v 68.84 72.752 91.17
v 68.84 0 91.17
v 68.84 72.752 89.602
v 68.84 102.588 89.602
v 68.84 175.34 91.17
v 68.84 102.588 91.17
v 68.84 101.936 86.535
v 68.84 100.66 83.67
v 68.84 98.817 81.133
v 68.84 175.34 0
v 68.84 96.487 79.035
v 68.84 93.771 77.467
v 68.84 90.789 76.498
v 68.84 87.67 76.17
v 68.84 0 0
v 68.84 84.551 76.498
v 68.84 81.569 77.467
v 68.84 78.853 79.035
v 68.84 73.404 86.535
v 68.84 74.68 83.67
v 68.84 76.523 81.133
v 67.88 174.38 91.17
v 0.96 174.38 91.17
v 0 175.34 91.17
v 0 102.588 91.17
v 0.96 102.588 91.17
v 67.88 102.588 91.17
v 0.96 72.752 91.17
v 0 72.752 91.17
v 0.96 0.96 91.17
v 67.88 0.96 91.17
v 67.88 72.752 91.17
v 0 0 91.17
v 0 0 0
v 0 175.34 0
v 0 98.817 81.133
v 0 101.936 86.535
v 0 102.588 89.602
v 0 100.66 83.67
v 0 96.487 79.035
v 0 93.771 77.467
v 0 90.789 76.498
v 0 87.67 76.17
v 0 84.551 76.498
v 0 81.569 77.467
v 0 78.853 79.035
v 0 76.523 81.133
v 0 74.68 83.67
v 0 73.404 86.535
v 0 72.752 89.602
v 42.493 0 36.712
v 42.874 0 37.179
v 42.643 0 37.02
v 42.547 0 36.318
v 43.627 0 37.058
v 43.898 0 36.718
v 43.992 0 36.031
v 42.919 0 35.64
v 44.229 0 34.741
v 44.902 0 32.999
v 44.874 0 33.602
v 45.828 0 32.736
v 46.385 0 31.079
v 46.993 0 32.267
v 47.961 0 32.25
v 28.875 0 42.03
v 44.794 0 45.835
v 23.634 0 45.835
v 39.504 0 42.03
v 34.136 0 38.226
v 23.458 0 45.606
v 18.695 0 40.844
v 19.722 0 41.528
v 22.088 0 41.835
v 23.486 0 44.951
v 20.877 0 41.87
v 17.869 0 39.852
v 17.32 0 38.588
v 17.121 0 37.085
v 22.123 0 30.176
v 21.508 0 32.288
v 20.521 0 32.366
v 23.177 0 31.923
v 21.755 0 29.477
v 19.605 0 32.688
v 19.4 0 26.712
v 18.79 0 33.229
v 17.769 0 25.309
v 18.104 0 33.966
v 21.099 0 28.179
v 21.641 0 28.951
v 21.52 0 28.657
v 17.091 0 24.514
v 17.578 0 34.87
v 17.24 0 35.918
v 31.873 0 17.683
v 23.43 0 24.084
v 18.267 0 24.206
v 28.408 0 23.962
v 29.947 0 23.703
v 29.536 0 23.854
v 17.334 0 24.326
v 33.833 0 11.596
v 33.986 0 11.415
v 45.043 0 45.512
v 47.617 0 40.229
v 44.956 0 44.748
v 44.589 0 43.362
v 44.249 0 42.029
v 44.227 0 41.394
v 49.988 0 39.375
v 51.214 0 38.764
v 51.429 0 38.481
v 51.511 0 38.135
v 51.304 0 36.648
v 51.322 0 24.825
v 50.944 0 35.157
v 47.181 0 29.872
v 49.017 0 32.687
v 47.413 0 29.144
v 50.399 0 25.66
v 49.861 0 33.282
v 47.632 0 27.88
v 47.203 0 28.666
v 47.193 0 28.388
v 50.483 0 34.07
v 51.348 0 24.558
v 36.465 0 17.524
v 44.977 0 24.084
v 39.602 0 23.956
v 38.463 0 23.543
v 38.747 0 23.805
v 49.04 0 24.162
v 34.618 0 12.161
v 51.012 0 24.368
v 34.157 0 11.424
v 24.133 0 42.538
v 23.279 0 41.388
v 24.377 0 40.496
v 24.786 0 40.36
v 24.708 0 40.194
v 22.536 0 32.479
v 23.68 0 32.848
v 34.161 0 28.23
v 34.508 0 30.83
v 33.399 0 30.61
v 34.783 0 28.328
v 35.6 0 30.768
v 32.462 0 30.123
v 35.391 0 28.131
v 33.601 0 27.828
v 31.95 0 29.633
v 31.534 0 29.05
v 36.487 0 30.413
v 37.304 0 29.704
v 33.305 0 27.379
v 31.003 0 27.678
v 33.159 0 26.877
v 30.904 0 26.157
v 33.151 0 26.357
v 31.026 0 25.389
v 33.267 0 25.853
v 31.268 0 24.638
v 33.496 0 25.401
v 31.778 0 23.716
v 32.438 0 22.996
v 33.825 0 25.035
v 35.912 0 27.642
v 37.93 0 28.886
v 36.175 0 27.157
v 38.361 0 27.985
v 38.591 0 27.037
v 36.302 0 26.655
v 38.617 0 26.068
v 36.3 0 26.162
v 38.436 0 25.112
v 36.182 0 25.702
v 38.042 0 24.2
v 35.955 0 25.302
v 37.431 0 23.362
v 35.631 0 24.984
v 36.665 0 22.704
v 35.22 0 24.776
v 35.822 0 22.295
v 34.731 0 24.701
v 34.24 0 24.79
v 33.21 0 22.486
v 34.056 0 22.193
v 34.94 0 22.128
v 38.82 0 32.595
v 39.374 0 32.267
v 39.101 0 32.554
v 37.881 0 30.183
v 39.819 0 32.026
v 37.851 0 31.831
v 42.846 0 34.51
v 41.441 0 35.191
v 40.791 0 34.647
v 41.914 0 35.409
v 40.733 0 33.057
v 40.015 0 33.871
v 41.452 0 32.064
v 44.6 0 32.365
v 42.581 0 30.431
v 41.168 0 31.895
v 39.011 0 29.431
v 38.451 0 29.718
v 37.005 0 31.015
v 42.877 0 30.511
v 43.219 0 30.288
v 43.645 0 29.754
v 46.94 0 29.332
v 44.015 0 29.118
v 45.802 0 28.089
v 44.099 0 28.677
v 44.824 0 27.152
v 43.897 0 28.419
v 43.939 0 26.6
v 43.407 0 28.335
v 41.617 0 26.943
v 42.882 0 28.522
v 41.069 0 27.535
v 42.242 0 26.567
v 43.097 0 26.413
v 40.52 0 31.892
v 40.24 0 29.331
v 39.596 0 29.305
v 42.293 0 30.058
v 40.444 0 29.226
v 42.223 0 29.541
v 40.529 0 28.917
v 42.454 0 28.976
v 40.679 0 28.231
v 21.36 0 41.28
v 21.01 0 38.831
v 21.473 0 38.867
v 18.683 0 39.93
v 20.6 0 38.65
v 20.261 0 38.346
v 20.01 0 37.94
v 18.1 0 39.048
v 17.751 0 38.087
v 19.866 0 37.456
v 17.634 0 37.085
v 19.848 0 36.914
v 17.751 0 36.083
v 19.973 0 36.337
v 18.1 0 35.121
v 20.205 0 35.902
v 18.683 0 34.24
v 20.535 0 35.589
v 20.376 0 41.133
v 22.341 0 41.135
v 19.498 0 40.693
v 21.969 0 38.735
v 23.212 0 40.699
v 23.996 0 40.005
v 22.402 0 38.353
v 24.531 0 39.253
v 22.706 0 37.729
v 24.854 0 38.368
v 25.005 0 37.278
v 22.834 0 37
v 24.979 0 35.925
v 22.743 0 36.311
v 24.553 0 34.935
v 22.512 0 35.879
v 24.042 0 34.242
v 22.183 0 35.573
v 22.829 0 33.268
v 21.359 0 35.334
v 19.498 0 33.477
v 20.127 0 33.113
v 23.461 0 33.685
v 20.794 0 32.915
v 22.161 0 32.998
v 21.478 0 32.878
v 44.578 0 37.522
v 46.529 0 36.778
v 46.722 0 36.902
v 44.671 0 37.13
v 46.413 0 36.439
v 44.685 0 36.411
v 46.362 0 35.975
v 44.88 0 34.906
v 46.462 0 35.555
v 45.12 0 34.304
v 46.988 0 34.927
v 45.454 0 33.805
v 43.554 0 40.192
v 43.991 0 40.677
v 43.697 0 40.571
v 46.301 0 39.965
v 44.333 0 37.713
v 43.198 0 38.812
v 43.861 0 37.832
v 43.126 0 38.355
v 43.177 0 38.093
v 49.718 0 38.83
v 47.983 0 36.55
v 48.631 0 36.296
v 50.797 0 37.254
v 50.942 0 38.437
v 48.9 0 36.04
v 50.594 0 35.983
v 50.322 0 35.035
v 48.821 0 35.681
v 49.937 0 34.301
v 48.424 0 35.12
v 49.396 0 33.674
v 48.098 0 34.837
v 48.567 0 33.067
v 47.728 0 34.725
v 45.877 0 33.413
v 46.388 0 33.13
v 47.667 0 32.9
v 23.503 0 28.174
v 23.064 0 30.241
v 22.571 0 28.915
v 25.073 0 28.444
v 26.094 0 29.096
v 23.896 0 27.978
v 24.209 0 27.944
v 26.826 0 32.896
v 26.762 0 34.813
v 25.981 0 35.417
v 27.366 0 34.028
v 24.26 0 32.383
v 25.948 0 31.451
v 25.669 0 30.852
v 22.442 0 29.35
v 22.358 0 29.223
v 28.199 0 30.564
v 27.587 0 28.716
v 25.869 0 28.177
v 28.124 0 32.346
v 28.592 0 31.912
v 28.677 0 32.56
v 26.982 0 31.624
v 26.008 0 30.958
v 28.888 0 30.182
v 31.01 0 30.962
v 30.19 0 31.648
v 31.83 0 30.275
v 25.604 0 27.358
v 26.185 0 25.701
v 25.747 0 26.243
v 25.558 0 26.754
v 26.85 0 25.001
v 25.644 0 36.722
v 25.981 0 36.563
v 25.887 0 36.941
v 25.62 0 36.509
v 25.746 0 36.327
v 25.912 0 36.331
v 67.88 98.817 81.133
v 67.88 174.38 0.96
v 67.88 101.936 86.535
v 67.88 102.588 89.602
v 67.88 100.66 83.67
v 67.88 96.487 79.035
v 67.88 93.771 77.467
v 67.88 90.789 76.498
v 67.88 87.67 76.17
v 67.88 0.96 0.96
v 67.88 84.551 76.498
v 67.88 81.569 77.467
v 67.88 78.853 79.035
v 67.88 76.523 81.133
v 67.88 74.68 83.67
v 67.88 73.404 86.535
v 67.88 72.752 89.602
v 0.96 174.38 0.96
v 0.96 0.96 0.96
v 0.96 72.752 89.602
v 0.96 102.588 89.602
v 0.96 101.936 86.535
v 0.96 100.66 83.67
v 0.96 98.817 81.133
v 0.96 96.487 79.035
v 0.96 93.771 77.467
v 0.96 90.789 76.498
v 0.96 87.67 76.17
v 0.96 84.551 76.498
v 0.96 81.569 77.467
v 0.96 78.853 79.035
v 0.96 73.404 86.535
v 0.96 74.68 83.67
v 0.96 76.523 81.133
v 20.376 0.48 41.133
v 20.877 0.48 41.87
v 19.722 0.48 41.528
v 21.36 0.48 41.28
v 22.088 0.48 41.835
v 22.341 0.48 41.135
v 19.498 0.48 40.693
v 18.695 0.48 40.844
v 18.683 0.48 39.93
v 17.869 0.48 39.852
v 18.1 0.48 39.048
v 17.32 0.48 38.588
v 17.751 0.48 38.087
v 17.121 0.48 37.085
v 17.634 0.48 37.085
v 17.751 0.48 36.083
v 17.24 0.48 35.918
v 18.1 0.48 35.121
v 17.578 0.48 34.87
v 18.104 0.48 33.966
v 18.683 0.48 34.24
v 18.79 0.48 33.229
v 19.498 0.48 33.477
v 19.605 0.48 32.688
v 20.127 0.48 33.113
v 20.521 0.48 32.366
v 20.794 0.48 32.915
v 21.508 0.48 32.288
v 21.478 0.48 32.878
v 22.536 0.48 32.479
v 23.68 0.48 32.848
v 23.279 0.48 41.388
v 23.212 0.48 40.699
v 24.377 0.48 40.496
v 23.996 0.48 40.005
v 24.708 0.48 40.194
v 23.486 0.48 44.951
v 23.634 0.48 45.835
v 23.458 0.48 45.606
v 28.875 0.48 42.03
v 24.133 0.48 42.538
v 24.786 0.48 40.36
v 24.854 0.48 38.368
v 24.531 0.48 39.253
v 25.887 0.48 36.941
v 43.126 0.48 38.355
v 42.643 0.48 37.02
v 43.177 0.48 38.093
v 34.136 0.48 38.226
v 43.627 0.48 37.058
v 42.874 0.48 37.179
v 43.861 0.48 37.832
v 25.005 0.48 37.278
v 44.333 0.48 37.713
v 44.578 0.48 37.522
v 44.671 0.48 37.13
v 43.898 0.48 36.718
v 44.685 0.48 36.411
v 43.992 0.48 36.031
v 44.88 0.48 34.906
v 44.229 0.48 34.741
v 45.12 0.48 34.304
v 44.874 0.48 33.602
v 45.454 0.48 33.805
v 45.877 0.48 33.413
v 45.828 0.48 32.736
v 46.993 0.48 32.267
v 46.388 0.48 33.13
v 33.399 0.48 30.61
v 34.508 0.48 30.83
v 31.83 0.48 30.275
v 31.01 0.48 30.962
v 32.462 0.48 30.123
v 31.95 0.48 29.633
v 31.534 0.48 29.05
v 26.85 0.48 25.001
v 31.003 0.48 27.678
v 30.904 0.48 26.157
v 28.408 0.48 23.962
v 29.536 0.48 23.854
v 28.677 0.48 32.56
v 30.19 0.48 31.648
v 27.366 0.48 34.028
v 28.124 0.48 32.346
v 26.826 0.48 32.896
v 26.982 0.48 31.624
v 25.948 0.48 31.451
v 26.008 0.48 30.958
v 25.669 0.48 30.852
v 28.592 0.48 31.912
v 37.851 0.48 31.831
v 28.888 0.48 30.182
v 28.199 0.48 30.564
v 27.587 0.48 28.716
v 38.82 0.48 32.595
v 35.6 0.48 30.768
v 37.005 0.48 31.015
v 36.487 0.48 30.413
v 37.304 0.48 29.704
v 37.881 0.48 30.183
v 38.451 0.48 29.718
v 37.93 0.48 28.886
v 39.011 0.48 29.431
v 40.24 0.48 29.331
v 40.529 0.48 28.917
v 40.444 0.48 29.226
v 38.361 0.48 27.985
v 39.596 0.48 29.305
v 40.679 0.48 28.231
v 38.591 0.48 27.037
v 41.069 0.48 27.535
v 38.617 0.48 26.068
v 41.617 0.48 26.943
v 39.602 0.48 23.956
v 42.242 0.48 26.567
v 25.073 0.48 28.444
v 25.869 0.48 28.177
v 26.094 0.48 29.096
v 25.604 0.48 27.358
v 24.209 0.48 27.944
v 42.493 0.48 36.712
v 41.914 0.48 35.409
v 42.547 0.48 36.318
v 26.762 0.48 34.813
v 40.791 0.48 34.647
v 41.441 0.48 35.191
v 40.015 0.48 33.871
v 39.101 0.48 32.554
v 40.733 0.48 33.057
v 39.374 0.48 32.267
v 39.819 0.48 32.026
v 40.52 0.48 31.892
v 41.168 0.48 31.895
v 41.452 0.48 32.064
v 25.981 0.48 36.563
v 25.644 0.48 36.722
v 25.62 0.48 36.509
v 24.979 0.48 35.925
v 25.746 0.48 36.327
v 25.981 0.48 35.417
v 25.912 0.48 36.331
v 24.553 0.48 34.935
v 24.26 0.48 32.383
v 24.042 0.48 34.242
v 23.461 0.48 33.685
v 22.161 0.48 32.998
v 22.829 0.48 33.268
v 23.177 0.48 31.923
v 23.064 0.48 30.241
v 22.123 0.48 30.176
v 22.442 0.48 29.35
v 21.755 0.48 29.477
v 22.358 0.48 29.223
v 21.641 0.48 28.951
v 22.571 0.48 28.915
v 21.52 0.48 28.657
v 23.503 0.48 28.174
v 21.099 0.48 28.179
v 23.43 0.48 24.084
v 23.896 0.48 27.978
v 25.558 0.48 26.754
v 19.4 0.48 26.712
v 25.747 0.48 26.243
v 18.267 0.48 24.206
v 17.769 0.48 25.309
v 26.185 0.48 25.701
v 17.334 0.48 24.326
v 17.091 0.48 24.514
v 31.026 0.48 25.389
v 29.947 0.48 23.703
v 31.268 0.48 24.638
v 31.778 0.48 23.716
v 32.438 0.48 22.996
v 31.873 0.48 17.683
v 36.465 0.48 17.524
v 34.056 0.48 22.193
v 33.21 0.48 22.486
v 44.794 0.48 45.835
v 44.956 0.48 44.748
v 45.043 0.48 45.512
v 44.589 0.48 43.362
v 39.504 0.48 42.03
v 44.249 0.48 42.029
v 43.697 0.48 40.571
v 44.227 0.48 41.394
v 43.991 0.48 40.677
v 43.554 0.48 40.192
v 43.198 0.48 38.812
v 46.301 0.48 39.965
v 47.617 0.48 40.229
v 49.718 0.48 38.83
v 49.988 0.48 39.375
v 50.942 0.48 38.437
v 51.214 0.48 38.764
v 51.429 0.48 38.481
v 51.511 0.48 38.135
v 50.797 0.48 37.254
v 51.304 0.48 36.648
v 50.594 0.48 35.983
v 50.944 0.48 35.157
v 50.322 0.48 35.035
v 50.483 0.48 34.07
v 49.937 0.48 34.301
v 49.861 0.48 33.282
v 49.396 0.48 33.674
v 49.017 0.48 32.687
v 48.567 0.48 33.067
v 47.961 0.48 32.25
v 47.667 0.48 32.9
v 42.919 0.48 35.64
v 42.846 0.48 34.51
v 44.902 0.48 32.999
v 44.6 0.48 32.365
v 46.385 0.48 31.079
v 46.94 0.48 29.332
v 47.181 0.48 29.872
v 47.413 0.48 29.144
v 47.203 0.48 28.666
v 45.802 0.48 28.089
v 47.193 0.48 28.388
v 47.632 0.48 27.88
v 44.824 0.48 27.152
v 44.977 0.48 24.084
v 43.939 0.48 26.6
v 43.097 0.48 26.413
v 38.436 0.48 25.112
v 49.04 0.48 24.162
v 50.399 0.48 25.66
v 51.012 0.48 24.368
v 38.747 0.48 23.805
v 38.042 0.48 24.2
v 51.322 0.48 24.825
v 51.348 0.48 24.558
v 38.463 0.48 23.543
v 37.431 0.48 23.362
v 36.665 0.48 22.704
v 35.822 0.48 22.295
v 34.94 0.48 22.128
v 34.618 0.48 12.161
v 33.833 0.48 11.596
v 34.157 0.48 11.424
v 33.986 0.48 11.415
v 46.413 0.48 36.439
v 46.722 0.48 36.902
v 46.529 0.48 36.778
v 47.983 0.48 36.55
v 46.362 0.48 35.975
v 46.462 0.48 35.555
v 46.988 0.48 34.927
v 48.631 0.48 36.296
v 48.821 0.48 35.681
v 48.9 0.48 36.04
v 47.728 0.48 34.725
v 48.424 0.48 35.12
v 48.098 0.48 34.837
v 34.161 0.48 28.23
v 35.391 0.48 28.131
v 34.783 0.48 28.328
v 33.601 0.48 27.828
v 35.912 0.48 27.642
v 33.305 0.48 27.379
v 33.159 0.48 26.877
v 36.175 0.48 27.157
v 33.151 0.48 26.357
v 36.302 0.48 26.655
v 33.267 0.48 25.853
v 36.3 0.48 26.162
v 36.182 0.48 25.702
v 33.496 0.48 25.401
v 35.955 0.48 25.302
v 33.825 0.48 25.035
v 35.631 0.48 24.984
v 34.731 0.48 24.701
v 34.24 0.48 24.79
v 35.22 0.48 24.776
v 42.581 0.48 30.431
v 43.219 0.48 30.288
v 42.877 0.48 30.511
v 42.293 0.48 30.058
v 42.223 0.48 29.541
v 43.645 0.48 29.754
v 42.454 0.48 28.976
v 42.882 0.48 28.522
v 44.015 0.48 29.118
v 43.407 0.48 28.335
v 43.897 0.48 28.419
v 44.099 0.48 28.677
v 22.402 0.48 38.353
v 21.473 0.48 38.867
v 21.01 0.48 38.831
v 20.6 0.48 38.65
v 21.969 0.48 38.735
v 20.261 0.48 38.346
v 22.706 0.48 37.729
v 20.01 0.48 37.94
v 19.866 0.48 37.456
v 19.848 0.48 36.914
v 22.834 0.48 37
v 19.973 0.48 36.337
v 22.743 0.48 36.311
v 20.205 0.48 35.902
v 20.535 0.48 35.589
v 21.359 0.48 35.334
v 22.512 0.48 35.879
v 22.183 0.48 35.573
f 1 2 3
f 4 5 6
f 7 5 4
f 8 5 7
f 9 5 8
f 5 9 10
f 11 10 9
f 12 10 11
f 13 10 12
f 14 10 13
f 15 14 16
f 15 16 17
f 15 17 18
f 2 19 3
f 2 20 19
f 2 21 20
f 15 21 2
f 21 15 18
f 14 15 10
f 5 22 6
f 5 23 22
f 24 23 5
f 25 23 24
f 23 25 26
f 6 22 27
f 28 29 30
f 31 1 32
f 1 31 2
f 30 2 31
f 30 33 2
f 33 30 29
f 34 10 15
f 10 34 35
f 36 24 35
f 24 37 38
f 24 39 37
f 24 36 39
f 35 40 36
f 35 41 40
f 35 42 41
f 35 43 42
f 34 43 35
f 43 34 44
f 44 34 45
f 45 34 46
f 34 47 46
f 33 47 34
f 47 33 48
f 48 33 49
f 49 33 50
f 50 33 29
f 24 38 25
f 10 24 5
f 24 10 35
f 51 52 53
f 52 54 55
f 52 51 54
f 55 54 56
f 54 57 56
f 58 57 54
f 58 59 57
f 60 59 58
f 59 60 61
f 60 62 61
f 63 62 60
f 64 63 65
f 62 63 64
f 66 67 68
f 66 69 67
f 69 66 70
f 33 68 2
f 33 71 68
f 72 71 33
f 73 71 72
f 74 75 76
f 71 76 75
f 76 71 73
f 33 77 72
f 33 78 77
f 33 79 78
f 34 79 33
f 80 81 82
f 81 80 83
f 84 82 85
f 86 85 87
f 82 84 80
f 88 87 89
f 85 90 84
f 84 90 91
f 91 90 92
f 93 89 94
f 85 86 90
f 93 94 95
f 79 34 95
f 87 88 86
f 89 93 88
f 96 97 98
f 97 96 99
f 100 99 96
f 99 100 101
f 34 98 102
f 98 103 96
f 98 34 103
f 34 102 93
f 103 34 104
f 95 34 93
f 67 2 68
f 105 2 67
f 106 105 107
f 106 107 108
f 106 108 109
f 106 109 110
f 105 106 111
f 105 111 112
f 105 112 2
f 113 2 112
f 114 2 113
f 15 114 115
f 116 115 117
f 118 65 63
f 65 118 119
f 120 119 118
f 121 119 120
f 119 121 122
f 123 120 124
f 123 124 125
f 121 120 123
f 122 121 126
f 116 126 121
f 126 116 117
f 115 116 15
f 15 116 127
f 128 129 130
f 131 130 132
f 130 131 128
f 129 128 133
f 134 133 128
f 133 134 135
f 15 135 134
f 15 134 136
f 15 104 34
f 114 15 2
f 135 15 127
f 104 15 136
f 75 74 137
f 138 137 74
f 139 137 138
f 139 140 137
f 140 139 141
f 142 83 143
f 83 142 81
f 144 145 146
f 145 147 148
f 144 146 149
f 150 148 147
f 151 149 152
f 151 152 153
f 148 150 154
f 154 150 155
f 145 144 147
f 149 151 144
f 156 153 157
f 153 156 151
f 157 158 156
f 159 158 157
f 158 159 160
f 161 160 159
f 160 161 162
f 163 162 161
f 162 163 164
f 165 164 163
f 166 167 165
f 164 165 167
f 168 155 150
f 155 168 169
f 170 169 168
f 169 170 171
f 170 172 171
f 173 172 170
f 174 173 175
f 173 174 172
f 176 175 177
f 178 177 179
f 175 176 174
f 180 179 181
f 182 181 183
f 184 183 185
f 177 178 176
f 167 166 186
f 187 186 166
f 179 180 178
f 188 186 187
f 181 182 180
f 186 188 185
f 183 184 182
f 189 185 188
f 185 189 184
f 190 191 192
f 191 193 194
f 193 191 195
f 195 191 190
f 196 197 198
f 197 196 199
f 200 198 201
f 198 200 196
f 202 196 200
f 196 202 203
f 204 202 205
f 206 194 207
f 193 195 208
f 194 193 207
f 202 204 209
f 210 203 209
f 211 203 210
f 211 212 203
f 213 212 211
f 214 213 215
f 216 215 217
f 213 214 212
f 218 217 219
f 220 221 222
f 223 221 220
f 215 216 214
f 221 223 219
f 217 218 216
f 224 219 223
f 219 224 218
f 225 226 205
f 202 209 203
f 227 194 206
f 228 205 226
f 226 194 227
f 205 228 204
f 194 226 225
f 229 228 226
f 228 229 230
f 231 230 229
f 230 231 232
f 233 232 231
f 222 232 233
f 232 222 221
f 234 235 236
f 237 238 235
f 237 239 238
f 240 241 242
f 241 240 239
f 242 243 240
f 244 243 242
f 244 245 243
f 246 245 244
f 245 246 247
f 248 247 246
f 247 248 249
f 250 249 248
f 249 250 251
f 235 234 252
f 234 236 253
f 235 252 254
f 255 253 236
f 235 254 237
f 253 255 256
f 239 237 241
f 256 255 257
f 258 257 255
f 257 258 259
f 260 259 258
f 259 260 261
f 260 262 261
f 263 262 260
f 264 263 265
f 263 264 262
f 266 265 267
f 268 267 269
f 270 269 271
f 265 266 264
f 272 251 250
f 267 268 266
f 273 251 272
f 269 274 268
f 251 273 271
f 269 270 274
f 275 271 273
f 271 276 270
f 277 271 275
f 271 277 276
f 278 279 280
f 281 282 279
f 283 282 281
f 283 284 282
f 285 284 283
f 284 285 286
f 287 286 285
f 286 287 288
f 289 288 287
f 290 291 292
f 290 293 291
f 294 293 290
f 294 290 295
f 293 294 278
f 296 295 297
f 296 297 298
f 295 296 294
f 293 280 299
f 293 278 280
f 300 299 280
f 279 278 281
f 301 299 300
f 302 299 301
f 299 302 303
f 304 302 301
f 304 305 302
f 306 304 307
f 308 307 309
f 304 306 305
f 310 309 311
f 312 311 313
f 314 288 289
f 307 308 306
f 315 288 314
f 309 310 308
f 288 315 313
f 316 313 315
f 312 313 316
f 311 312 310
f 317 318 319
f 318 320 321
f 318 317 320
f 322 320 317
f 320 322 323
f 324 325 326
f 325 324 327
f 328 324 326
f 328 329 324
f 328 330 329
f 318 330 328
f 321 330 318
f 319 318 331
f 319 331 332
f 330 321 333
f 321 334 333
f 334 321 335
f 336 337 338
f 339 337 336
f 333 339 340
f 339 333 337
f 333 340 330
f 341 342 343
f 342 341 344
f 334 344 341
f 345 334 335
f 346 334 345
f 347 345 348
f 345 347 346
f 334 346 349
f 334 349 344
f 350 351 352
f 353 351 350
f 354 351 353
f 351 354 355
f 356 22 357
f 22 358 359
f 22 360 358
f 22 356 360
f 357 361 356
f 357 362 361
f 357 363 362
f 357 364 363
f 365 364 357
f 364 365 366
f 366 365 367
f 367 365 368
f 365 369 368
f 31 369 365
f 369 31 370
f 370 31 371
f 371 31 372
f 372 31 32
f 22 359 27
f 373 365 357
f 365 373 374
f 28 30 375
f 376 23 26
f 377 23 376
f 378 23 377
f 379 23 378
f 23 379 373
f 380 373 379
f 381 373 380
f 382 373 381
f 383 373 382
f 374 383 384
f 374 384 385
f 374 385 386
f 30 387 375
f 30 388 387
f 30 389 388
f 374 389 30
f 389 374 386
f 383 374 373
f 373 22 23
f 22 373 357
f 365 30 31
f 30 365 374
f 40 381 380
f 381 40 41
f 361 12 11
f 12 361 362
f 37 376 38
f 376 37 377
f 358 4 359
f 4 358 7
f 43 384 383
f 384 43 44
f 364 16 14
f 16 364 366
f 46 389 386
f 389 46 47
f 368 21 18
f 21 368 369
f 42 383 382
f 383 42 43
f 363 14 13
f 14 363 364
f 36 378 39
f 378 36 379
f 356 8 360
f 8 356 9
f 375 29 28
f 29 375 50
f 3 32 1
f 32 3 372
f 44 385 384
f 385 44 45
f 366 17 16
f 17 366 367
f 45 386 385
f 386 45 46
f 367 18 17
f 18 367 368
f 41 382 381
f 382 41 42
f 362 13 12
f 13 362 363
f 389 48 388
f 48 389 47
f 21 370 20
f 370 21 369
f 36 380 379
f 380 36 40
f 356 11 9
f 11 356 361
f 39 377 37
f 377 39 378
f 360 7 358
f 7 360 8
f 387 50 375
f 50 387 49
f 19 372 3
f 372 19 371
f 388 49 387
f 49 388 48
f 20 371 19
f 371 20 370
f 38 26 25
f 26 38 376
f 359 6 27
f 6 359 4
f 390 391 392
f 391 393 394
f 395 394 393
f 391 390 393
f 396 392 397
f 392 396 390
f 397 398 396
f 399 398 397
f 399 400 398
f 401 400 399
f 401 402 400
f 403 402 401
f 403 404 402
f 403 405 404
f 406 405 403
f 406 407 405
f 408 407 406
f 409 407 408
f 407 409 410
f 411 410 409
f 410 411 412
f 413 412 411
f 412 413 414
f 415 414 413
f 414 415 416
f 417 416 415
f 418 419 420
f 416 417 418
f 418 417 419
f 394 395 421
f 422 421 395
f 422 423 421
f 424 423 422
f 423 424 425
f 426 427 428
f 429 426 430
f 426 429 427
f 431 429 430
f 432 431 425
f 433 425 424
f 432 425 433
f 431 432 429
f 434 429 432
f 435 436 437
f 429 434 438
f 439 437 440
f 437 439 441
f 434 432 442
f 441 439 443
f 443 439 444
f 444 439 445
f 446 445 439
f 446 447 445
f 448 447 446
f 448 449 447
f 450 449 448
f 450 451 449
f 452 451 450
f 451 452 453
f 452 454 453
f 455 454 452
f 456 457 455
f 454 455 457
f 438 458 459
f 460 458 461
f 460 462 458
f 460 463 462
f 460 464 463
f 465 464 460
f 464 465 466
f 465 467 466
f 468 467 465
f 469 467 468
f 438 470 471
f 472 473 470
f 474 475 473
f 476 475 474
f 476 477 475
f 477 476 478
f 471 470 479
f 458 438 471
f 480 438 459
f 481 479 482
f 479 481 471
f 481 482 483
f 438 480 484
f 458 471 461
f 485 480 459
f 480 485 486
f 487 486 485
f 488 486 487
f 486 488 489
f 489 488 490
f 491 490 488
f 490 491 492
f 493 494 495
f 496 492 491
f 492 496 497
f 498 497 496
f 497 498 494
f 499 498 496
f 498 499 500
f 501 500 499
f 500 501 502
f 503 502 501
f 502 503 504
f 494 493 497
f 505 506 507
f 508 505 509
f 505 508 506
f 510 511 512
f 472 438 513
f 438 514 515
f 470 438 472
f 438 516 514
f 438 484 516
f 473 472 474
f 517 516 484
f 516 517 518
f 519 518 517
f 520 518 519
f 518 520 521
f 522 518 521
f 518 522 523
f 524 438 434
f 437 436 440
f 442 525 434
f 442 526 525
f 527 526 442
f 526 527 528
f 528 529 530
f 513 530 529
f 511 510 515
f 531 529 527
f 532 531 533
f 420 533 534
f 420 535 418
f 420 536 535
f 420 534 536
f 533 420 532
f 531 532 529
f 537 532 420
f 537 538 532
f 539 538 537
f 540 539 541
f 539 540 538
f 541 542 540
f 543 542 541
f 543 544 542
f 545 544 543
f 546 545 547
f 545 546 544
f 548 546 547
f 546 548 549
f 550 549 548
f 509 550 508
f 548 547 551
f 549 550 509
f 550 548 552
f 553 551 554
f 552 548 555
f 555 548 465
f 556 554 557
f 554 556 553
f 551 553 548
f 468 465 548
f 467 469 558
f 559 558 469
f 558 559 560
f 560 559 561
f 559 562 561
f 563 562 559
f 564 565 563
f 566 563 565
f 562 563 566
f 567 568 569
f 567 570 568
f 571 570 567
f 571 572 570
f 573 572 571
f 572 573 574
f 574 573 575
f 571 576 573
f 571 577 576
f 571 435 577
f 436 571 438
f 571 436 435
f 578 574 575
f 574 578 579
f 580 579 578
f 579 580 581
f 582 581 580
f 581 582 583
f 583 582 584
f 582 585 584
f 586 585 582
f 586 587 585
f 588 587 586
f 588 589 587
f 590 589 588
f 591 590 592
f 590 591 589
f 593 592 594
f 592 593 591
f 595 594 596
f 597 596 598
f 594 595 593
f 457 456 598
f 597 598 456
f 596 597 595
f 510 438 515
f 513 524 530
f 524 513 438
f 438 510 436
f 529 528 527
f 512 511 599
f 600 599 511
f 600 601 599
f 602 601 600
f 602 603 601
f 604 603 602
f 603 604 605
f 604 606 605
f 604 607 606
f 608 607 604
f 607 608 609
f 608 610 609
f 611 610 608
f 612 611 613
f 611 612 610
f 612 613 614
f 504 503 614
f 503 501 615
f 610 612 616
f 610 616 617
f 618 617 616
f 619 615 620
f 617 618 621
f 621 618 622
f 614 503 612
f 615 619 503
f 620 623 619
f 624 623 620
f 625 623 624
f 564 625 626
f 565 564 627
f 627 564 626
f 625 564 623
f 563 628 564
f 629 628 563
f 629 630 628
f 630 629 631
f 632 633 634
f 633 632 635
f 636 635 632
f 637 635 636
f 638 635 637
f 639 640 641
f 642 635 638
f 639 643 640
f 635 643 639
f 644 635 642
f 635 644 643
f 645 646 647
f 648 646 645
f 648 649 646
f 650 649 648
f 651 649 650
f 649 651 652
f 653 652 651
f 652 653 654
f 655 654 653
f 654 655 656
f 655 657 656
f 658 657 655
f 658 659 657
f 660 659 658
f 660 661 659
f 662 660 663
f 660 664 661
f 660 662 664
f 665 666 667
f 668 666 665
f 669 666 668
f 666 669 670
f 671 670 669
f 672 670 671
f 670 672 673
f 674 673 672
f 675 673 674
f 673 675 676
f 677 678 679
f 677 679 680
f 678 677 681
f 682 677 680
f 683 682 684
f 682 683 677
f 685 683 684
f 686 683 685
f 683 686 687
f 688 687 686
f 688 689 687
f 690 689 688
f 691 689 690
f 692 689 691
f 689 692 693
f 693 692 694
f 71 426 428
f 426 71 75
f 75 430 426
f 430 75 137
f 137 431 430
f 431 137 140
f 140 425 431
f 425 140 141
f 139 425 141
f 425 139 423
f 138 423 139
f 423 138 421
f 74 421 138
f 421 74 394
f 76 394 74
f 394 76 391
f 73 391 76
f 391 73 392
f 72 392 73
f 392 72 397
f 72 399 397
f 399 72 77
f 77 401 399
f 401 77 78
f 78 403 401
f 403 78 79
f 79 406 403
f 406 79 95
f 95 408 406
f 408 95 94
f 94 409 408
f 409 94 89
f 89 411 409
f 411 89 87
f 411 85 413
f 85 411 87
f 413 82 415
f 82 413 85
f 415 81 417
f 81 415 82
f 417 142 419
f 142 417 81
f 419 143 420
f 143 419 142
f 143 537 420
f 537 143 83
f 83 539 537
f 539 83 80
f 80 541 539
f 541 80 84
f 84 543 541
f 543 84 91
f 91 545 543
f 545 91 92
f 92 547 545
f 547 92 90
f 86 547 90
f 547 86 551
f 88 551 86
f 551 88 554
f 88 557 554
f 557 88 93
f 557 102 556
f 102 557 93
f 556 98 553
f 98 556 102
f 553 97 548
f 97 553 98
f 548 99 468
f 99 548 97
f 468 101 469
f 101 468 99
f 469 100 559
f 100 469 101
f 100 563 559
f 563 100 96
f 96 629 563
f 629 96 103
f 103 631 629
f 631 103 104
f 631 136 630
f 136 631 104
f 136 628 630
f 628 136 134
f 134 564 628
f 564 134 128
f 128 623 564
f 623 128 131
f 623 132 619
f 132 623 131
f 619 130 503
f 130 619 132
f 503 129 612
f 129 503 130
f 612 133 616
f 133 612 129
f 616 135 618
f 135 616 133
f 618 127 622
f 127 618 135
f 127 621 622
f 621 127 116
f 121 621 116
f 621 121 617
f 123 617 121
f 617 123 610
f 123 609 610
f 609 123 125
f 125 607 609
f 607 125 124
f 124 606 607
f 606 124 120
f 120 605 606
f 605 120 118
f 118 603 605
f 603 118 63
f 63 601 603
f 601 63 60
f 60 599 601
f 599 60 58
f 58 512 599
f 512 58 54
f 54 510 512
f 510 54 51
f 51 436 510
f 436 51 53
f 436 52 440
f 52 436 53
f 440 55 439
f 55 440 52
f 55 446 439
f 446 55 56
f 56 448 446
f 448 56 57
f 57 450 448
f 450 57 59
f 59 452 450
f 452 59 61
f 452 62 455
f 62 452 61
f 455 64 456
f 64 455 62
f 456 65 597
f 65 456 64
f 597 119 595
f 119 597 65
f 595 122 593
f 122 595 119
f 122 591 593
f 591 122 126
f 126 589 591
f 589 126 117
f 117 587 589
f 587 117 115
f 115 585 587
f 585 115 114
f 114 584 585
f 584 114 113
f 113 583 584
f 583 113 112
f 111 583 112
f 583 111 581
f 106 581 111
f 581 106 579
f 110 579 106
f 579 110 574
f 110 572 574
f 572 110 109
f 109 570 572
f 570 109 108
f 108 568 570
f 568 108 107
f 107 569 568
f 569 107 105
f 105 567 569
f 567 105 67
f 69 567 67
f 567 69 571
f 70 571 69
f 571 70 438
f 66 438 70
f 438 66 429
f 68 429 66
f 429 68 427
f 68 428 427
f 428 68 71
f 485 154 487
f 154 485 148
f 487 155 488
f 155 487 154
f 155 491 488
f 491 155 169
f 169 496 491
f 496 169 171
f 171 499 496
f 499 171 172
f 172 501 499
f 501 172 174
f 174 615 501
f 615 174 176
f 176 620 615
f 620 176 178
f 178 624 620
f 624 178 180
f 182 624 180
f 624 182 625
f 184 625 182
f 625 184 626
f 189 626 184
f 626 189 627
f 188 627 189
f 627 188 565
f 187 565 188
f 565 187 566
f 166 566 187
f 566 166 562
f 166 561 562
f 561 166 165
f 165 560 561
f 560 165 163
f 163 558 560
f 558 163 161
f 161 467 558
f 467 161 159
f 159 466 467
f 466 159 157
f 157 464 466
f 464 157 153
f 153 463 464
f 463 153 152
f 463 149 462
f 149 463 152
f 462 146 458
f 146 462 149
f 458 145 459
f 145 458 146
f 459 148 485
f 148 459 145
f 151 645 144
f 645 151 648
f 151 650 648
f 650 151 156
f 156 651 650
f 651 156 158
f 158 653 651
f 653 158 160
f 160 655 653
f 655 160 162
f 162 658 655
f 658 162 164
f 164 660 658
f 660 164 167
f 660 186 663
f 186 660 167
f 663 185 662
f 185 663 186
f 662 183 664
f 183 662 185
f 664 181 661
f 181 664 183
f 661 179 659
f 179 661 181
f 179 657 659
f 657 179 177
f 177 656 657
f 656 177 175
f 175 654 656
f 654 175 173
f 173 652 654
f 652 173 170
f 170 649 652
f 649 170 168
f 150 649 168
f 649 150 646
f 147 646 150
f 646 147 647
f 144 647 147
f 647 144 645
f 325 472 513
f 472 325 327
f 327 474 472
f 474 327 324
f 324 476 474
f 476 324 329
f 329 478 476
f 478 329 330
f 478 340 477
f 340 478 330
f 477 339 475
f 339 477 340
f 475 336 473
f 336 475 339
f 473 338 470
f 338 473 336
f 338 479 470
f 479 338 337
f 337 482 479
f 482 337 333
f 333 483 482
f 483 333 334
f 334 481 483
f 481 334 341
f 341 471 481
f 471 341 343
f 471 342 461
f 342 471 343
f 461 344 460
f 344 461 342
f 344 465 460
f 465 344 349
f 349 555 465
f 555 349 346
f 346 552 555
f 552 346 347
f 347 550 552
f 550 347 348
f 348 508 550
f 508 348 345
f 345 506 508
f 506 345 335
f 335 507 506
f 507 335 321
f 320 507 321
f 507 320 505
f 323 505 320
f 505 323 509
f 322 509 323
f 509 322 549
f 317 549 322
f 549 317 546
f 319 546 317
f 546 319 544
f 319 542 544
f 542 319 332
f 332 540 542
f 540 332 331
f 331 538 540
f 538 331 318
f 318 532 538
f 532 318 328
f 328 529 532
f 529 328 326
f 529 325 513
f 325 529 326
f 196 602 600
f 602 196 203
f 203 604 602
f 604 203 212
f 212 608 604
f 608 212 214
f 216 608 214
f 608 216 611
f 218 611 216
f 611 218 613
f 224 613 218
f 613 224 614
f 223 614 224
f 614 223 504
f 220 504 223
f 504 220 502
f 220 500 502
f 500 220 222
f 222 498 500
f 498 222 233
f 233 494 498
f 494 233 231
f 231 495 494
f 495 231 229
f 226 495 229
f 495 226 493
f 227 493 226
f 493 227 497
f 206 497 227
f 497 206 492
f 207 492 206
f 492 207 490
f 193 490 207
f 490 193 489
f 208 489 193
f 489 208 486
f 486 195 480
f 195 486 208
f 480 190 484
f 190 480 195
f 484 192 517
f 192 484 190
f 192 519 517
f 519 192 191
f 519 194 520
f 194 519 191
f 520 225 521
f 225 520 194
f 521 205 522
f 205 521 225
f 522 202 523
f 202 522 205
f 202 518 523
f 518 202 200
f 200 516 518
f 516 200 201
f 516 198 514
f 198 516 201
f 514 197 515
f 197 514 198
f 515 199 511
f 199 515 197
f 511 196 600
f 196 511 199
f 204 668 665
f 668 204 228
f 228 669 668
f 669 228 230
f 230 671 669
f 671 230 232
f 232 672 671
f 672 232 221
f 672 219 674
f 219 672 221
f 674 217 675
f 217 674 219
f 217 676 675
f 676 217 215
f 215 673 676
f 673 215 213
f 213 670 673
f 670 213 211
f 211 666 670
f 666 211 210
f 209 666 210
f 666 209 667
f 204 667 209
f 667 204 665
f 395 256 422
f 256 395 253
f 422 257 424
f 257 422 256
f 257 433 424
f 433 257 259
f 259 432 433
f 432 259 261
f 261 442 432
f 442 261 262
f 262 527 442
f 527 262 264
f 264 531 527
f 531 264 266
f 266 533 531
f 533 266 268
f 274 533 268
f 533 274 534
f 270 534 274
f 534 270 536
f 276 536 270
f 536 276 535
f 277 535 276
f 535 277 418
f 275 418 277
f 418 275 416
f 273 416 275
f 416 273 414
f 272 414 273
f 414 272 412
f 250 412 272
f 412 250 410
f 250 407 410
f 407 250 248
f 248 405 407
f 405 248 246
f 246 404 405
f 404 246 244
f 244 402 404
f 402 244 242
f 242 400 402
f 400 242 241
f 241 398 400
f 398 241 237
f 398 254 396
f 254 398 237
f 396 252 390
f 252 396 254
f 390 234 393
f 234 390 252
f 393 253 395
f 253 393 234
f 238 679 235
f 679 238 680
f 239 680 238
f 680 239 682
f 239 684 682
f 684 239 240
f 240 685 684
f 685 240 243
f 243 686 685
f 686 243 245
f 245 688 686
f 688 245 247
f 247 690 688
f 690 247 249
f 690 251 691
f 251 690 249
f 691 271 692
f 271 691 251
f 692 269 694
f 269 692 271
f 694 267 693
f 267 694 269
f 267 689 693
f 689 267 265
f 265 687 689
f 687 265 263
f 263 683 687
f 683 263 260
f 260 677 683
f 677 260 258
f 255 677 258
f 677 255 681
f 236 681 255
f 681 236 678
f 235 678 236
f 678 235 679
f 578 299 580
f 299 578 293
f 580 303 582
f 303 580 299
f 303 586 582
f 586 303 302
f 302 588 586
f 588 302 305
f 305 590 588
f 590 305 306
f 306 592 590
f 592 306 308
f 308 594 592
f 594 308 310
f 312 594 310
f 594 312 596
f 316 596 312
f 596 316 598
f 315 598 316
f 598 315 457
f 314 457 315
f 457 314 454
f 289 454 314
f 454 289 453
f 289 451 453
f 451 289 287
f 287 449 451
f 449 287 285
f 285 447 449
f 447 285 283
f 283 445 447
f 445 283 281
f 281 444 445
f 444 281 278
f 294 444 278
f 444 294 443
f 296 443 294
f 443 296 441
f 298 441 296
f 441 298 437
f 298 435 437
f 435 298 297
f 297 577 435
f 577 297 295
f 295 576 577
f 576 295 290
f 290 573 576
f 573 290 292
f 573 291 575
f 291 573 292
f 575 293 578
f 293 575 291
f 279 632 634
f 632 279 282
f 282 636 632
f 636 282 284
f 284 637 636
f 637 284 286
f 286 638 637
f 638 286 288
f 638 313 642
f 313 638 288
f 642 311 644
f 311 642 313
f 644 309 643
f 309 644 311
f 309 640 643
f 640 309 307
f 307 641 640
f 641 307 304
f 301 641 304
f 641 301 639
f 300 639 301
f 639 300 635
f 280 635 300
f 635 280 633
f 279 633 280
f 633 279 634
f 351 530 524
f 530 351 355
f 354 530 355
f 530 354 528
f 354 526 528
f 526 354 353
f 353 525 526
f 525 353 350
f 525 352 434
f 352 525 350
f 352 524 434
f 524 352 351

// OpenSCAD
cardWidth=63.5;
cardHeight=88.5;
cardThickness=0.34;

cardPerBox=500;
cardBlockLength=cardThickness*cardPerBox;

spaceAroundCard=0.25;
spaceAroundLid=0.5;

wallthickness=0.96;

fingerCutout=30;

// 1 for base box, 0 for lid, 2 for Logo only
boxOrLidOrLogo=0;

// logo filename
//logoFile=""; //No Logo


// logoFile="Pokemon_Card_Sets_Logos/pokemon-unbroken-bonds-set-symbol-150x150.dxf"; //Unbroken Bonds	2019
// logoFile="Pokemon_Card_Sets_Logos/detective-pikachu-set-symbol-150x147.dxf"; //Detective Pikachu	2019
// logoFile="Pokemon_Card_Sets_Logos/pokemon-team-up-set-symbol-150x150.dxf"; //Team Up	2019
// logoFile="Pokemon_Card_Sets_Logos/sm-lost-thunder-set-symbol-145x150.dxf"; //Lost Thunder	2018
// logoFile="Pokemon_Card_Sets_Logos/dragon-majesty-pokemon-set-symbol-150x150.dxf"; //Dragon Majesty	2018
// logoFile="Pokemon_Card_Sets_Logos/sun-and-moon-celestial-storm-pokemon-set-symbol-150x150.dxf"; //Celestial Storm	2018
// logoFile="Pokemon_Card_Sets_Logos/sun-and-moon-forbidden-light-pokemon-set-symbol-150x150.dxf"; //Forbidden Light	2018
// logoFile="Pokemon_Card_Sets_Logos/sun-and-moon-ultra-prism-pokemon-set-symbol-1-150x150.dxf"; //Ultra Prism	2018
// logoFile="Pokemon_Card_Sets_Logos/sun-and-moon-crimson-invasion-pokemon-set-symbol-150x150.dxf"; //Crimson Invasion	2017
// logoFile="Pokemon_Card_Sets_Logos/shining-legends-pokemon-set-symbol-150x150.dxf"; //Shining Legends	2017
// logoFile="Pokemon_Card_Sets_Logos/sun-and-moon-burning-shadows-set-symbol-150x150.dxf"; //Burning Shadows	2017
// logoFile="Pokemon_Card_Sets_Logos/sun-and-moon-guardians-rising-pokemon-set-symbol-150x150.dxf"; //Guardians Rising	2017
// logoFile="Pokemon_Card_Sets_Logos/sun-and-moon-pokemon-set-symbol-150x150.dxf"; //Sun & Moon	2017
// logoFile="Pokemon_Card_Sets_Logos/xy-promos-pokemon-set-symbol-150x136.dxf"; //Sun & Moon Promos	2016
// logoFile="Pokemon_Card_Sets_Logos/xy-evolutions-pokemon-set-symbol-150x150.dxf"; //Evolutions	2016
// logoFile="Pokemon_Card_Sets_Logos/xy-steam-siege-pokemon-set-symbol-150x150.dxf"; //Steam Siege	2016
// logoFile="Pokemon_Card_Sets_Logos/xy-fates-collide-pokemon-set-symbol-150x150.dxf"; //Fates Collide	2016
// logoFile="Pokemon_Card_Sets_Logos/generations-pokemon-set-symbol-150x150.dxf"; //Generations	2016
// logoFile="Pokemon_Card_Sets_Logos/xy-BREAKpoint-pokemon-set-symbol-150x150.dxf"; //BREAKpoint	2016
// logoFile="Pokemon_Card_Sets_Logos/xy-BREAKthrough-pokemon-set-symbol-150x150.dxf"; //BREAKthrough	2015
// logoFile="Pokemon_Card_Sets_Logos/xy-ancient-origins-pokemon-set-symbol-150x150.dxf"; //Ancient Origins	2015
// logoFile="Pokemon_Card_Sets_Logos/xy-roaring-skies-pokemon-set-symbol-150x150.dxf"; //Roaring Skies	2015
// logoFile="Pokemon_Card_Sets_Logos/xy-double-crisis-pokemon-set-symbol.png-150x150.dxf"; //Double Crisis	2015
// logoFile="Pokemon_Card_Sets_Logos/xy-primal-clash-pokemon-set-symbol-150x150.dxf"; //Primal Clash	2015
// logoFile="Pokemon_Card_Sets_Logos/xy-phantom-forces-pokemon-set-symbol-150x150.dxf"; //Phantom Forces	2014
// logoFile="Pokemon_Card_Sets_Logos/xy-furious-fists-pokemon-set-symbol-150x150.dxf"; //Furious Fists	2014
// logoFile="Pokemon_Card_Sets_Logos/xy-flashfire-pokemon-set-symbol-150x150.dxf"; //Flashfire	2014
// logoFile="Pokemon_Card_Sets_Logos/xy-pokemon-set-symbol-150x150.dxf"; //XY	2014
// logoFile="Pokemon_Card_Sets_Logos/xy-kalos-starter-pokemon-set-symbol-150x150.dxf"; //Kalos Starter Set	2013
// logoFile="Pokemon_Card_Sets_Logos/xy-promos-pokemon-set-symbol-150x136.dxf"; //XY - Promos	2013
// logoFile="Pokemon_Card_Sets_Logos/black-and-white-legendary-treasures-pokemon-set-symbol-150x150.dxf"; //Legendary Treasures	2013
// logoFile="Pokemon_Card_Sets_Logos/black-and-white-plasma-blast-pokemon-set-symbol-150x150.dxf"; //Plasma Blast	2013
// logoFile="Pokemon_Card_Sets_Logos/black-and-white-plasma-freeze-pokemon-set-symbol-150x150.dxf"; //Plasma Freeze	2013
// logoFile="Pokemon_Card_Sets_Logos/black-and-white-plasma-storm-pokemon-set-symbol-150x150.dxf"; //Plasma Storm	2013
// logoFile="Pokemon_Card_Sets_Logos/black-and-white-boundaries-crossed-pokemon-set-symbol-150x150.dxf"; //Boundaries Crossed	2012
// logoFile="Pokemon_Card_Sets_Logos/black-and-white-dragon-vault-pokemon-set-symbol-150x150.dxf"; //Dragon Vault	2012
// logoFile="Pokemon_Card_Sets_Logos/black-and-white-dragons-exalted-pokemon-set-symbol-150x150.dxf"; //Dragons Exalted	2012
// logoFile="Pokemon_Card_Sets_Logos/black-and-white-dark-explorers-pokemon-set-symbol-150x150.dxf"; //Dark Explorers	2012
// logoFile="Pokemon_Card_Sets_Logos/black-and-white-next-destinies-pokemon-set-symbol-150x150.dxf"; //Next Destinies	2012
// logoFile="Pokemon_Card_Sets_Logos/black-and-white-noble-victories-pokemon-set-symbol-150x150.dxf"; //Noble Victories	2011
// logoFile="Pokemon_Card_Sets_Logos/black-and-white-emerging-powers-pokemon-set-symbol-150x150.dxf"; //Emerging Powers	2011
// logoFile="Pokemon_Card_Sets_Logos/black-and-white-pokemon-set-symbol-150x150.dxf"; //Black and White Base Set	2011
// logoFile="Pokemon_Card_Sets_Logos/call-of-legends-pokemon-set-symbol-150x150.dxf"; //Call of Legends	2011
// logoFile="Pokemon_Card_Sets_Logos/heartgold-and-soulsilver-triumphant-pokemon-set-symbol-150x150.dxf"; //Triumphant	2010
// logoFile="Pokemon_Card_Sets_Logos/heartgold-and-soulsilver-undaunted-pokemon-set-symbol-150x150.dxf"; //Undaunted	2010
// logoFile="Pokemon_Card_Sets_Logos/heartgold-and-soulsilver-unleashed-pokemon-set-symbol-150x150.dxf"; //Unleashed	2010
// logoFile="Pokemon_Card_Sets_Logos/heartGold-and-soulSilver-pokemon-set-symbol-150x150.dxf"; //HeartGold and SoulSilver	2010
// logoFile="Pokemon_Card_Sets_Logos/heartgold-soulsilver-promos-pokemon-set-symbol-150x136.dxf"; //HeartGold and SoulSilver Promos	2010
// logoFile="Pokemon_Card_Sets_Logos/arceus-pokemon-set-symbol-150x150.dxf"; //Arceus	2009
// logoFile="Pokemon_Card_Sets_Logos/supreme-victors-pokemon-set-symbol-150x150.dxf"; //Supreme Victors	2009
// logoFile="Pokemon_Card_Sets_Logos/rising-rivals-pokemon-set-symbol-150x150.dxf"; //Rising Rivals	2009
// logoFile="Pokemon_Card_Sets_Logos/pokemon-pop-series-9-set-symbol-150x92.dxf"; //POP Series 9	2009
// logoFile="Pokemon_Card_Sets_Logos/platinum-base-set-pokemon-set-symbol-150x150.dxf"; //Platinum Base Set	2009
// logoFile="Pokemon_Card_Sets_Logos/pokemon-pop-series-8-set-symbol-150x91.dxf"; //POP Series 8	2008 - 2009
// logoFile="Pokemon_Card_Sets_Logos/stormfront-pokemon-set-symbol-150x150.dxf"; //Stormfront	2008
// logoFile="Pokemon_Card_Sets_Logos/legends-awakened-pokemon-set-symbol-150x150.dxf"; //Legends Awakened	2008
// logoFile="Pokemon_Card_Sets_Logos/majestic-dawn-pokemon-set-symbol-150x150.dxf"; //Majestic Dawn	2008
// logoFile="Pokemon_Card_Sets_Logos/pokemon-pop-series-7-set-symbol-150x95.dxf"; //POP Series 7	2008
// logoFile="Pokemon_Card_Sets_Logos/great-encounters-pokemon-set-symbol-150x150.dxf"; //Great Encounters	2008	
// logoFile="Pokemon_Card_Sets_Logos/secret-wonders-pokemon-set-symbol-150x150.dxf"; //Secret Wonders	2007
// logoFile="Pokemon_Card_Sets_Logos/pokemon-pop-series-6-set-symbol-150x91.dxf"; //POP Series 6	2007 - 2008
// logoFile="Pokemon_Card_Sets_Logos/mysterious-treasures-pokemon-set-symbol-150x150.dxf"; //Mysterious Treasures	2007
// logoFile="Pokemon_Card_Sets_Logos/diamond-and-pearl-pokemon-set-symbol-150x150.dxf"; //Diamond & Pearl	2007
// logoFile="Pokemon_Card_Sets_Logos/diamond-pearl-promos-pokemon-set-symbol-150x136.dxf"; //Diamond & Pearl Promos	2007
// logoFile="Pokemon_Card_Sets_Logos/pokemon-pop-series-5-set-symbol-150x97.dxf"; //POP Series 5	2007
// logoFile="Pokemon_Card_Sets_Logos/ex-power-keepers-pokemon-set-symbol-150x150.dxf"; //Power Keepers	2007
// logoFile="Pokemon_Card_Sets_Logos/ex-dragon-frontiers-pokemon-set-symbol-150x150.dxf"; //Dragon Frontiers	2006
// logoFile="Pokemon_Card_Sets_Logos/ex-crystal-guardians-pokemon-set-symbol-150x150.dxf"; //Crystal Guardians	2006
// logoFile="Pokemon_Card_Sets_Logos/pokemon-pop-series-4-set-symbol-150x92.dxf"; //POP Series 4	2006 - 2007
// logoFile="Pokemon_Card_Sets_Logos/ex-holon-phantoms-pokemon-set-symbol-150x150.dxf"; //Holon Phantoms	2006
// logoFile="Pokemon_Card_Sets_Logos/pokemon-pop-series-3-set-symbol-150x94.dxf"; //POP Series 3	2006
// logoFile="Pokemon_Card_Sets_Logos/ex-trainer-kit-2-minun-pokemon-set-symbol-115x150.dxf"; //EX Trainer Kit 2	2006
// logoFile="Pokemon_Card_Sets_Logos/ex-legend-maker-pokemon-set-symbol-150x150.dxf"; //Legend Maker	2006
// logoFile="Pokemon_Card_Sets_Logos/ex-delta-species-pokemon-set-symbol-150x150.dxf"; //Delta Species	2005
// logoFile="Pokemon_Card_Sets_Logos/ex-unseen-forces-pokemon-set-symbol-150x150.dxf"; //Unseen Forces	2005
// logoFile="Pokemon_Card_Sets_Logos/pokemon-pop-series-2-set-symbol-150x94.dxf"; //POP Series 2	2005 - 2006
// logoFile="Pokemon_Card_Sets_Logos/ex-emerald-pokemon-set-symbol-150x150.dxf"; //Emerald	2005
// logoFile="Pokemon_Card_Sets_Logos/ex-deoxys-pokemon-set-symbol-150x150.dxf"; //Deoxys	2005
// logoFile="Pokemon_Card_Sets_Logos/ex-team-rocket-returns-pokemon-set-symbol.dxf"; //Team Rocket Returns	2004
// logoFile="Pokemon_Card_Sets_Logos/pokemon-pop-series-1-set-symbol-150x100.dxf"; //POP Series 1	2004 - 2005
// logoFile="Pokemon_Card_Sets_Logos/ex-fire-red-and-leaf-green-pokemon-set-symbol.dxf"; //Fire Red and Leaf Green	2004
// logoFile="Pokemon_Card_Sets_Logos/ex-hidden-legends-pokemon-set-symbol.dxf"; //Hidden Legends	2004
// logoFile="Pokemon_Card_Sets_Logos/pokemon-ex-trainer-kit-latias-set-symbol-150x101.dxf"; //EX Trainer Kit	2004
// logoFile="Pokemon_Card_Sets_Logos/ex-team-magma-vs-team-aqua-pokemon-set-symbol.dxf"; //Team Magma vs Team Aqua	2004
// logoFile="Pokemon_Card_Sets_Logos/ex-dragon-pokemon-set-symbol.dxf"; //Dragon	2003
// logoFile="Pokemon_Card_Sets_Logos/ex-sandstorm-pokemon-set-symbol.dxf"; //Sandstorm	2003
// logoFile="Pokemon_Card_Sets_Logos/ex-ruby-and-sapphire-pokemon-set-symbol.dxf"; //Ruby and Sapphire	2003
// logoFile="Pokemon_Card_Sets_Logos/skyridge-pokemon-set-symbol.dxf"; //Skyridge	2003
// logoFile="Pokemon_Card_Sets_Logos/pokemon-nintendo-black-star-promos-set-symbol-150x136.dxf"; //Nintendo Black Star Promos	2003 - 2006
// logoFile="Pokemon_Card_Sets_Logos/aquapolis-pokemon-set-symbol.dxf"; //Aquapolis	2003
// logoFile="Pokemon_Card_Sets_Logos/expedition-base-set-pokemon-set-symbol.dxf"; //Expedition	2002
// logoFile="Pokemon_Card_Sets_Logos/legendary-collection-pokemon-set-symbol.dxf"; //Legendary Collection	2002
// logoFile="Pokemon_Card_Sets_Logos/neo-destiny-pokemon-set-symbol.dxf"; //Neo Destiny	2002
// logoFile="Pokemon_Card_Sets_Logos/neo-revelation-pokemon-set-symbol-150x97.dxf"; //Neo Revelation	2001
// logoFile="Pokemon_Card_Sets_Logos/pokemon-southern-islands-set-symbol-150x118.dxf"; //Southern Islands	2001
// logoFile="Pokemon_Card_Sets_Logos/neo-discovery-pokemon-set-symbol.dxf"; //Neo Discovery	2001
// logoFile="Pokemon_Card_Sets_Logos/neo-genesis-pokemon-set-symbol.dxf"; //Neo Genesis	2000
// logoFile="Pokemon_Card_Sets_Logos/gym-challenge-pokemon-set-symbol-150x92.dxf"; //Gym Challenge	2000
// logoFile="Pokemon_Card_Sets_Logos/gym-heroes-pokemon-set-symbol-150x91.dxf"; //Gym Heroes	2000
// logoFile="Pokemon_Card_Sets_Logos/team-rocket-pokemon-set-symbol.dxf"; //Team Rocket	2000
// logoFile="Pokemon_Card_Sets_Logos/base-set-2-pokemon-set-symbol.dxf"; //Base Set 2	2000
// logoFile="Pokemon_Card_Sets_Logos/fossil-pokemon-set-symbol.dxf"; //Fossil	1999
 logoFile="Pokemon_Card_Sets_Logos/pokemon-wizards-black-star-promos-set-symbol-150x136.dxf"; //Wizards Black Star Promos	1999 - 2003
// logoFile="Pokemon_Card_Sets_Logos/jungle-pokemon-set-symbol.dxf"; //Jungle	1999
//logoFile="Pokemon_Card_Sets_Logos/.dxf"; //Base Set	1999
// logoFile="Pokemon_Card_Sets_Logos/mcdonalds-pokemon-2018-set-symbol-150x140.dxf"; //McDonald’s 2018	2018
// logoFile="Pokemon_Card_Sets_Logos/mcdonalds-pokemon-2017-set-symbol-150x150.dxf"; //McDonald’s 2017	2017
// logoFile="Pokemon_Card_Sets_Logos/mcdonalds-pokemon-2016-set-symbol-150x140.dxf"; //McDonald’s 2016	2016
// logoFile="Pokemon_Card_Sets_Logos/mcdonalds-pokemon-2015-set-symbol-148x150.dxf"; //McDonald’s 2015	2015
// logoFile="Pokemon_Card_Sets_Logos/mcdonalds-pokemon-2014-set-symbol-150x148.dxf"; //McDonald’s 2014	2014
// logoFile="Pokemon_Card_Sets_Logos/mcdonalds-pokemon-2013-set-symbol.dxf"; //McDonald’s 2013	2013
// logoFile="Pokemon_Card_Sets_Logos/mcdonalds-pokemon-2012-set-symbol-150x150.dxf"; //McDonald’s 2012	2012
// logoFile="Pokemon_Card_Sets_Logos/mcdonalds-pokemon-2011-set-symbol-150x130.dxf"; //McDonald’s 2011	2011


if (boxOrLidOrLogo==0) {
   mainLid();
}
if (boxOrLidOrLogo==1) {
   mainBox();
}
if (boxOrLidOrLogo==2) {
   Logo();
}

module mainBox () {
    difference() {
        Box();
        translate([
            (cardWidth+(spaceAroundCard*2)+(wallthickness*2))/2,
            cardBlockLength+(spaceAroundCard*2)+(wallthickness*3),
            cardHeight+spaceAroundCard+wallthickness
            ]){
            rotate(a=[90,0,0]){
                cylinder(h=(cardBlockLength+(spaceAroundCard*2)+(wallthickness*4)),d=fingerCutout);
            }
        }
    }
}


module Box () {
    difference() {
        cube([
        cardWidth+(spaceAroundCard*2)+(wallthickness*2),
        cardBlockLength+(spaceAroundCard*2)+(wallthickness*2),
        cardHeight+spaceAroundCard+wallthickness
        ]);
        translate([wallthickness,wallthickness,wallthickness]) {
            cube([
            cardWidth+(spaceAroundCard*2),
            cardBlockLength+(spaceAroundCard*2),
            cardHeight+spaceAroundCard+wallthickness
            ]);
        }
    }
}

module mainLid () {
    difference() {
        LidBox();
        translate([
            -spaceAroundLid,
            (cardBlockLength+(spaceAroundCard*2)+(wallthickness*4)+(spaceAroundLid*2))/2,
            cardHeight+spaceAroundCard+(wallthickness*2)+(spaceAroundLid)
            ]){
            rotate(a=[0,90,0]){
                cylinder(h=cardWidth+(spaceAroundCard*2)+(wallthickness*4)+(spaceAroundLid*4),d=fingerCutout);
            }
        }
        if (logoFile) Logo();
    }
}


module LidBox () {
    difference() {
        cube([
        cardWidth+(spaceAroundCard*2)+(wallthickness*4)+(spaceAroundLid*2),
        cardBlockLength+(spaceAroundCard*2)+(wallthickness*4)+(spaceAroundLid*2),
        cardHeight+spaceAroundCard+(wallthickness*2)+(spaceAroundLid)
        ]);
        translate([wallthickness,wallthickness,wallthickness]) {
            cube([
            cardWidth+(spaceAroundCard*2)+(wallthickness*2)+(spaceAroundLid*2),
            cardBlockLength+(spaceAroundCard*2)+(wallthickness*2)+(spaceAroundLid*2),
            cardHeight+spaceAroundCard+(wallthickness*2)+(spaceAroundLid)
            ]);
        }
    }
}

module Logo () {
        
    boxwidth=cardWidth+(spaceAroundCard*2)+(wallthickness*4)+(spaceAroundLid*2);
    translate([((boxwidth/2)/2)+(boxwidth/2),wallthickness/2,boxwidth/1.5]) {
        rotate(a=[90,180,0]){
            resize([boxwidth/2,boxwidth/2,wallthickness/2]) {
                linear_extrude(height = 4) import(logoFile);
            }
        }
    }
     
    
    
}
